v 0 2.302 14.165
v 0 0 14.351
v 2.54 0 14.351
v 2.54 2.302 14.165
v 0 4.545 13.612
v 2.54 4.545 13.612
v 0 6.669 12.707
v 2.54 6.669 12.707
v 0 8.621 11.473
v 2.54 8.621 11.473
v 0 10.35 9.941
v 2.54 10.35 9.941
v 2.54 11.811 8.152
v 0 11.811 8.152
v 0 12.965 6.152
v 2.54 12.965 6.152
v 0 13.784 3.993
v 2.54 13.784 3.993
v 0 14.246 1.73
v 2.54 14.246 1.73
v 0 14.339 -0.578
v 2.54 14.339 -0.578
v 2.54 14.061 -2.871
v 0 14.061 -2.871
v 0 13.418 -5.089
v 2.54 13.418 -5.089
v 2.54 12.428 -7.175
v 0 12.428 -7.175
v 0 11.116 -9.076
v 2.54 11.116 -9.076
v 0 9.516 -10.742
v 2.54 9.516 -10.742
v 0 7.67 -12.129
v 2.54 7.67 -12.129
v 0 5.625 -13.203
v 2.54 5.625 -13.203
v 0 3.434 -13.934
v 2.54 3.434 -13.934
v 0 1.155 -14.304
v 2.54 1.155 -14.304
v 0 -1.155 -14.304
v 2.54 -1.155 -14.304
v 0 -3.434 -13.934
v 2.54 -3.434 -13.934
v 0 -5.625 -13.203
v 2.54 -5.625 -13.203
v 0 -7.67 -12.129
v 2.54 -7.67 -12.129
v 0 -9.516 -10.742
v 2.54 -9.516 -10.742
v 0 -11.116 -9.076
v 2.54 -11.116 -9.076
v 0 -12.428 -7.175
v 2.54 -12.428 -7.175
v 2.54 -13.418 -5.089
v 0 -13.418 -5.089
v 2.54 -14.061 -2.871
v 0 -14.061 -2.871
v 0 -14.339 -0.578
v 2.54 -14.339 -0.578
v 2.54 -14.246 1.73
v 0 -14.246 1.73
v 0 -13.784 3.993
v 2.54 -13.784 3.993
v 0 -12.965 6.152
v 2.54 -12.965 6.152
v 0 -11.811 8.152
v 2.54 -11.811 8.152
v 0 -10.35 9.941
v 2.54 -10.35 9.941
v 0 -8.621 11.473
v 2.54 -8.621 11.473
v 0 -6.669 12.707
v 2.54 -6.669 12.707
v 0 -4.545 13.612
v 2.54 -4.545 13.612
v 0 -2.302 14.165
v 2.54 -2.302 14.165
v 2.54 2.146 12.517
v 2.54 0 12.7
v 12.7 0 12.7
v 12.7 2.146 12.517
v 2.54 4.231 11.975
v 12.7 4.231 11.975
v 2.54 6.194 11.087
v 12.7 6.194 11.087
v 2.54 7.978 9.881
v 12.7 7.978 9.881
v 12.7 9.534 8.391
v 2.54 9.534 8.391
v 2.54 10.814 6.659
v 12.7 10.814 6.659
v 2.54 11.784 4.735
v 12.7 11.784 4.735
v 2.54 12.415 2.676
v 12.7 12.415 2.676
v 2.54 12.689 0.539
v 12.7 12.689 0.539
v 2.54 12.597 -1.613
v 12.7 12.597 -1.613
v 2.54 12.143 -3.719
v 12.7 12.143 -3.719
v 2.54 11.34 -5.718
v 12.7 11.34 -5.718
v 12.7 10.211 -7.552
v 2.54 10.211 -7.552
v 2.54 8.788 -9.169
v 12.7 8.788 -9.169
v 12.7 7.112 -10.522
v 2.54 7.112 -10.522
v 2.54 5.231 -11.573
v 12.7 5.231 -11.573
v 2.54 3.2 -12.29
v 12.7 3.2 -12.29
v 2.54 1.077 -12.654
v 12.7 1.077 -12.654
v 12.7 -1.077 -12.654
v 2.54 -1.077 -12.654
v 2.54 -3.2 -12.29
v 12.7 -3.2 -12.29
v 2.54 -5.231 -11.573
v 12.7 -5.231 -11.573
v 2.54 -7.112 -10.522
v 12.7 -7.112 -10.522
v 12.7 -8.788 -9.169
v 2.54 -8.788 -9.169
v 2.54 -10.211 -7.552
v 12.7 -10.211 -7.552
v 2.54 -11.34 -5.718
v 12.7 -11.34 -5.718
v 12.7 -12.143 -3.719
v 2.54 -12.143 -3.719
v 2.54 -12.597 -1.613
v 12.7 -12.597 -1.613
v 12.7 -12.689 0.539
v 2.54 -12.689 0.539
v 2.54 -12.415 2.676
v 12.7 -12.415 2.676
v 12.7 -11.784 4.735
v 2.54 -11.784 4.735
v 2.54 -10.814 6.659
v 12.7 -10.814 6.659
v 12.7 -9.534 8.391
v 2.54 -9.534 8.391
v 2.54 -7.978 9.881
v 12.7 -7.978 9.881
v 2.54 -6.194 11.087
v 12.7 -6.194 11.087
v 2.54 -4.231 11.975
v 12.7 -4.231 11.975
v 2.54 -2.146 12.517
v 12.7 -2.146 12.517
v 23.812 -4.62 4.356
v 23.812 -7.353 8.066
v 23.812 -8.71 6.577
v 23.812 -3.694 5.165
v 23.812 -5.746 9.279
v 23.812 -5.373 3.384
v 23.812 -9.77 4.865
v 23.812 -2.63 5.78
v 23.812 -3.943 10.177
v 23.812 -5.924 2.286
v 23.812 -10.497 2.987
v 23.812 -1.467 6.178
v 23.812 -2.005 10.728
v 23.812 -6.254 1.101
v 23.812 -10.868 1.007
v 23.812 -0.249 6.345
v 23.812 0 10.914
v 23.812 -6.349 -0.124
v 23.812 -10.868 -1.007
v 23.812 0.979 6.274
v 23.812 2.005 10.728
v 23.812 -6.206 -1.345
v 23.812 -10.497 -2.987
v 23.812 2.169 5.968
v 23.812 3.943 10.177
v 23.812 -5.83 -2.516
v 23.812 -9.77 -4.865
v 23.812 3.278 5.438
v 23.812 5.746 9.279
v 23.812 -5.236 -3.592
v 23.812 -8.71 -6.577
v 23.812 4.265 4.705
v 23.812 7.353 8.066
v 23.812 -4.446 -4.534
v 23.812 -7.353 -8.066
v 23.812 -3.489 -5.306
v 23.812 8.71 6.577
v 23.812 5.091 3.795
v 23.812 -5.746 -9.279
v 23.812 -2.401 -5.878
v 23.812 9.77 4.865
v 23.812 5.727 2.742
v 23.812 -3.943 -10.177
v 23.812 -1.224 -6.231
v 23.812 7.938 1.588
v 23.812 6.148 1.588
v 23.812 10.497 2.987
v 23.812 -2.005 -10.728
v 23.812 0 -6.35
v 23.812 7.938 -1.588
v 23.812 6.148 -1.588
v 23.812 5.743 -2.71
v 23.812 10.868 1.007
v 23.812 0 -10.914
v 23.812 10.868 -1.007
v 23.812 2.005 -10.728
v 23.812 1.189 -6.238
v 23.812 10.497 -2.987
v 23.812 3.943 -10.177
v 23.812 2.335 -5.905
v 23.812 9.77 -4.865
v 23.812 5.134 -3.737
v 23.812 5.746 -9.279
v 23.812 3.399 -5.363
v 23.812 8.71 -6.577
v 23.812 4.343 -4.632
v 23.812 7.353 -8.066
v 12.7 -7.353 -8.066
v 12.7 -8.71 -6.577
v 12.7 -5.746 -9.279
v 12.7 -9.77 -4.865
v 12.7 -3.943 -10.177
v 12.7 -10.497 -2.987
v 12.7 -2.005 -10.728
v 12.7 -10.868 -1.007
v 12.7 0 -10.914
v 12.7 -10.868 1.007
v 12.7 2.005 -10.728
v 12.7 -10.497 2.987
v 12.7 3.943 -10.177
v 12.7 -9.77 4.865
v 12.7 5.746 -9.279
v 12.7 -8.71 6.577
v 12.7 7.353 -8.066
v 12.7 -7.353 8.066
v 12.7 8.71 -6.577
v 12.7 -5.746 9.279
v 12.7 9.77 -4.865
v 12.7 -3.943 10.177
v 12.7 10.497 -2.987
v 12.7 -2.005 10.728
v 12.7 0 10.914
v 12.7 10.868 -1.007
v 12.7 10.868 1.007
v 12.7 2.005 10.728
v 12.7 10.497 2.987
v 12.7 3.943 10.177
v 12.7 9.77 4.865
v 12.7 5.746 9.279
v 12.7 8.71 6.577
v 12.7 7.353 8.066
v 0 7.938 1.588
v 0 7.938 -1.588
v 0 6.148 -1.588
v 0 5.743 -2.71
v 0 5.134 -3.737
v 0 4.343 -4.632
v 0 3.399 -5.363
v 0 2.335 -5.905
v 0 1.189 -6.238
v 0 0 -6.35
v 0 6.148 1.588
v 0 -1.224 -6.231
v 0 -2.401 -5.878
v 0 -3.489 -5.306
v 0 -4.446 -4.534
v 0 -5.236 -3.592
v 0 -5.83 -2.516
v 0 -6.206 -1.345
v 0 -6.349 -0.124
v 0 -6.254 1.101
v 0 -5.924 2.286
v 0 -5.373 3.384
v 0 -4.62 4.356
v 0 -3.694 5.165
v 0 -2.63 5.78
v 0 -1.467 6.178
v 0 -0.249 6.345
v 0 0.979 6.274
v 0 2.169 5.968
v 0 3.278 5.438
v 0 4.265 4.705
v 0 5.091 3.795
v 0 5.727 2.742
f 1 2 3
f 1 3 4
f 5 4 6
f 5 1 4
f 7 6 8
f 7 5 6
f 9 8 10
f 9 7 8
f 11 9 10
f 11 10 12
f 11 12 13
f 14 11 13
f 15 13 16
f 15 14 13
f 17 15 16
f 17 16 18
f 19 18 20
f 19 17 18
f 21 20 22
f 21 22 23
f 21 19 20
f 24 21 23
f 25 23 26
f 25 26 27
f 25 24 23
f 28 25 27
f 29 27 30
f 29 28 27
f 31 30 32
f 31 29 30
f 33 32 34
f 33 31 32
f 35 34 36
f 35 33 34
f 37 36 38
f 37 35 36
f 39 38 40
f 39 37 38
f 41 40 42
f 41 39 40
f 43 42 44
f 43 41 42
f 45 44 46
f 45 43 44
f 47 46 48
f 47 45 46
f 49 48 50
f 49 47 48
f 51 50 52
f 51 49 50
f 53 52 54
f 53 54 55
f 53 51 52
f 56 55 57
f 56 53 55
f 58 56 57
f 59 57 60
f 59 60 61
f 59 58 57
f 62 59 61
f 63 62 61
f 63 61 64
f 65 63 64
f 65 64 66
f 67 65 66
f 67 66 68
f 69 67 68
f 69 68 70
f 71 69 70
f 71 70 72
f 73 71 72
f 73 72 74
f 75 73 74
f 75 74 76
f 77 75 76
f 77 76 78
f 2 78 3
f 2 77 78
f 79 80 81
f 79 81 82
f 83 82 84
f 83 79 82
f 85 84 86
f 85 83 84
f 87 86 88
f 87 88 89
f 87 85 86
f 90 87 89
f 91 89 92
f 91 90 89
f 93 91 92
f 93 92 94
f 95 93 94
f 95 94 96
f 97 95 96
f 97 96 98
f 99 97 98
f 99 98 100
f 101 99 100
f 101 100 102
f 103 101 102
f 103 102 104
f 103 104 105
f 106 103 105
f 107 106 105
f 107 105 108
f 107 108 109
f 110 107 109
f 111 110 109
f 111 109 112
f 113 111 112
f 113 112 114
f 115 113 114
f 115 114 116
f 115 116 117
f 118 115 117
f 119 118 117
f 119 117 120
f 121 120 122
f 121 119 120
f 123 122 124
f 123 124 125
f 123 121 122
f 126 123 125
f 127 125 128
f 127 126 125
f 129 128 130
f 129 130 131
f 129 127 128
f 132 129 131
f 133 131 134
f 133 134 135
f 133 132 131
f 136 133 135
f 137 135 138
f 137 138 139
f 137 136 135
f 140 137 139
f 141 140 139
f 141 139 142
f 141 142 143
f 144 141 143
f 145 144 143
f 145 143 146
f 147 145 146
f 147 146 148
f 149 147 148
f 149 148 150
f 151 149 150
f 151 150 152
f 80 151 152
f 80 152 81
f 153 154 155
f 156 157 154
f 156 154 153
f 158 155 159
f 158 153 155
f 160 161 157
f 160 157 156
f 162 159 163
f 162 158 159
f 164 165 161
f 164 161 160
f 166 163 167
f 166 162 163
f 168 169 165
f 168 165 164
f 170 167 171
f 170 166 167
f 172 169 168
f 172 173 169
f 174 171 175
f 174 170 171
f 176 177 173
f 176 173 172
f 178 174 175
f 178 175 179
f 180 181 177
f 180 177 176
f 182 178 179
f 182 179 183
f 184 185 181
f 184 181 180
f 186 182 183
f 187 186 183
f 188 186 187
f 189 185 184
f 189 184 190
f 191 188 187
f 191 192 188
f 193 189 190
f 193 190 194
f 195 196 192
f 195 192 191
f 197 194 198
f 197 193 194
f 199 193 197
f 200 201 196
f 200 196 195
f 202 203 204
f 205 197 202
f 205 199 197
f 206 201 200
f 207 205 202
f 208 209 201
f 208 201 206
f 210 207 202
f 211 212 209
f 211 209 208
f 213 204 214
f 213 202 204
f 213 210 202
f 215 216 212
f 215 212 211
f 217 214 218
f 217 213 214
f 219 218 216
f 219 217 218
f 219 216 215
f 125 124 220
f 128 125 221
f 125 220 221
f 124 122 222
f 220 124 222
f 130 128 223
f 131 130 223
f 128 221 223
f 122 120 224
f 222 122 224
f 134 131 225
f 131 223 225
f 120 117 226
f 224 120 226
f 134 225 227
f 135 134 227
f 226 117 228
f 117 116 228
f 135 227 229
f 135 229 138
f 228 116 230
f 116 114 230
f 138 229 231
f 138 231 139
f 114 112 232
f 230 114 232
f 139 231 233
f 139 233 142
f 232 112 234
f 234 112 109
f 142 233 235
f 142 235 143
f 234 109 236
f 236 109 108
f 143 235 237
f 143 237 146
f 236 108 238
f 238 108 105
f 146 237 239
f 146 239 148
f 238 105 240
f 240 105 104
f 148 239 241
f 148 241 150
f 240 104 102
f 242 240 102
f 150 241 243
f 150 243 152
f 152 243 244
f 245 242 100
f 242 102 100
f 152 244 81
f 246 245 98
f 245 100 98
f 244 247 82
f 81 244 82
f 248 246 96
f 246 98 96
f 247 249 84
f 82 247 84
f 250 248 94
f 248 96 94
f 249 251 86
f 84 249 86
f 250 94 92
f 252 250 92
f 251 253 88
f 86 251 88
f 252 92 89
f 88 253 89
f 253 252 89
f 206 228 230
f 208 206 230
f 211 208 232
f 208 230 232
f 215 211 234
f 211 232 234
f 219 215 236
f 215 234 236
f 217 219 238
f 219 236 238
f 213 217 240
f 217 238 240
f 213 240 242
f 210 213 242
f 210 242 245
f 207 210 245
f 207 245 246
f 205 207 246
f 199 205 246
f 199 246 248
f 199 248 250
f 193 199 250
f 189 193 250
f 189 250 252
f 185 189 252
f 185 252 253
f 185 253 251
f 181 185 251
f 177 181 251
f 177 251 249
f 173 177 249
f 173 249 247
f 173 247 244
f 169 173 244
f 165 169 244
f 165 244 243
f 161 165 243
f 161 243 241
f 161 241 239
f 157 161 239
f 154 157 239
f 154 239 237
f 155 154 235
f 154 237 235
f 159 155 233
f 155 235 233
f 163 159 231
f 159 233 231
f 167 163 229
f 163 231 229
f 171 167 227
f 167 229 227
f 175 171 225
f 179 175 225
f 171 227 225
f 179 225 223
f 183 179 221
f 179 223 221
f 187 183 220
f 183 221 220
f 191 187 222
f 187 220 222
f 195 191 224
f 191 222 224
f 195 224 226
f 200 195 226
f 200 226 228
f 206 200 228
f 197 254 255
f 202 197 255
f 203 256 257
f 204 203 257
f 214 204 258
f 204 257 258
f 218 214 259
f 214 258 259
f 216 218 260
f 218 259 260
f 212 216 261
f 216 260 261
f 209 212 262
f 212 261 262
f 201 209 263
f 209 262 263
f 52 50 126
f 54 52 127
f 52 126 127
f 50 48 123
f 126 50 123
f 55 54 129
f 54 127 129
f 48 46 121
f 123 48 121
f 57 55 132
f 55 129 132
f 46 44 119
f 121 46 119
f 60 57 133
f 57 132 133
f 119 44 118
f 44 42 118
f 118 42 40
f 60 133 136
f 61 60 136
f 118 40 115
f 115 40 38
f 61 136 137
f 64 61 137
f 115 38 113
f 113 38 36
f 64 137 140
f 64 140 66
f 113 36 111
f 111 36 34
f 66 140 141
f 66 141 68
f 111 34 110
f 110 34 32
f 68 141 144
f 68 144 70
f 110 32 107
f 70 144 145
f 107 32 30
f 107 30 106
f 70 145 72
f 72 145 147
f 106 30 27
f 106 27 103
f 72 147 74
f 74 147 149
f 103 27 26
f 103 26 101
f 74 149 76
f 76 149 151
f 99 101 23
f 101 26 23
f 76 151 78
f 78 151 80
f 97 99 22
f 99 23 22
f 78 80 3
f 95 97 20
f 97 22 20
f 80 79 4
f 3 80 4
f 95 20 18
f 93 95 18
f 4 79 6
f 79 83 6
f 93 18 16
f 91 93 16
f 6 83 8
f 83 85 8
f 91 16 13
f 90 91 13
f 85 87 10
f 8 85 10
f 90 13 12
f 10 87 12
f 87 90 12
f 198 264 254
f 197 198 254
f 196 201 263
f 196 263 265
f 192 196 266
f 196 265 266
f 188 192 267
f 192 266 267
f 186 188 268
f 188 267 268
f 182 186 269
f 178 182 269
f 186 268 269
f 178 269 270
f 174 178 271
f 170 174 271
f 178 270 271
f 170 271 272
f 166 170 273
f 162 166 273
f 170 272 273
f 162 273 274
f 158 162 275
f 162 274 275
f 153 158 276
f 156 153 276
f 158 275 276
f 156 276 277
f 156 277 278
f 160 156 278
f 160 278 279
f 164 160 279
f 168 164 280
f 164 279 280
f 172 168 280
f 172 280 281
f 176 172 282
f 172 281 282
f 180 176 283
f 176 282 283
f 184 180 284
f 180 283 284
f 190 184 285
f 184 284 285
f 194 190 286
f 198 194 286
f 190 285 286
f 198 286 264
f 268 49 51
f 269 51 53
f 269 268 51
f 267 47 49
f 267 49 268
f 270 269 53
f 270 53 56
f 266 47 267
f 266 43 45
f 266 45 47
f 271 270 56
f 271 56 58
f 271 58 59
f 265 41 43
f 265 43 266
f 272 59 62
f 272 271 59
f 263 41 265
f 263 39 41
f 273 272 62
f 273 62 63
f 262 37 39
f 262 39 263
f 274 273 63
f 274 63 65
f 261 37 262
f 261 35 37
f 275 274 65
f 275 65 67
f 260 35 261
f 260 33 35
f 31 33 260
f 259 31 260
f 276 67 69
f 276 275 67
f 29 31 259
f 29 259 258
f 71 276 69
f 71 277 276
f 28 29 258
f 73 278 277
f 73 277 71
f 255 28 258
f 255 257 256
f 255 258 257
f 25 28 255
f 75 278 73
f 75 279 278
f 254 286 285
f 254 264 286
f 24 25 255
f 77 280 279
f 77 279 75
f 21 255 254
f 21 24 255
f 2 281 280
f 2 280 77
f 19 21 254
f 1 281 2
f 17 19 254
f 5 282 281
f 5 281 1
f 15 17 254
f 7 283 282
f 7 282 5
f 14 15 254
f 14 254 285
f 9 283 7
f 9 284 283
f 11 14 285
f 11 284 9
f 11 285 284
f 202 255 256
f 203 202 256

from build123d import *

# Parameters (mm, degrees)
SKETCH1_R           = 10.9140625
BOSS_EXTRUDE1_DEPTH = 23.8125
SKETCH2_R           = 12.7
SKETCH2_R_2         = 10.9140625
BOSS_EXTRUDE2_DEPTH = 12.7
SKETCH5_R           = 14.351
SKETCH5_R_2         = 12.7
BOSS_EXTRUDE3_DEPTH = 2.54


with BuildPart() as part:
    # Sketch1 → Boss-Extrude1 (new body)
    with BuildSketch(Plane(origin=(0, 0, 0), x_dir=(0, 0, -1), z_dir=(1, 0, 0))):
        Circle(SKETCH1_R)
        with BuildLine():
            Line((-1.5875, 6.148361062), (-1.5875, 7.9375))
            Line((-1.5875, 7.9375), (1.5875, 7.9375))
            Line((1.5875, 7.9375), (1.5875, 6.148361062))
            ThreePointArc((1.5875, 6.148361062), (5.020115786, 3.888564967), (6.35, 0))
            ThreePointArc((6.35, 0), (-3.888564967, -5.020115786), (-1.5875, 6.148361062))
        make_face(mode=Mode.SUBTRACT)
    extrude(amount=BOSS_EXTRUDE1_DEPTH)

    # Sketch2 → Boss-Extrude2 (add)
    with BuildSketch(Plane.ZY):
        Circle(SKETCH2_R)
        Circle(SKETCH2_R_2, mode=Mode.SUBTRACT)
    extrude(amount=-BOSS_EXTRUDE2_DEPTH)

    # Sketch5 → Boss-Extrude3 (add)
    with BuildSketch(Plane.ZY):
        Circle(SKETCH5_R)
        Circle(SKETCH5_R_2, mode=Mode.SUBTRACT)
    extrude(amount=-BOSS_EXTRUDE3_DEPTH)


solid = part.part
